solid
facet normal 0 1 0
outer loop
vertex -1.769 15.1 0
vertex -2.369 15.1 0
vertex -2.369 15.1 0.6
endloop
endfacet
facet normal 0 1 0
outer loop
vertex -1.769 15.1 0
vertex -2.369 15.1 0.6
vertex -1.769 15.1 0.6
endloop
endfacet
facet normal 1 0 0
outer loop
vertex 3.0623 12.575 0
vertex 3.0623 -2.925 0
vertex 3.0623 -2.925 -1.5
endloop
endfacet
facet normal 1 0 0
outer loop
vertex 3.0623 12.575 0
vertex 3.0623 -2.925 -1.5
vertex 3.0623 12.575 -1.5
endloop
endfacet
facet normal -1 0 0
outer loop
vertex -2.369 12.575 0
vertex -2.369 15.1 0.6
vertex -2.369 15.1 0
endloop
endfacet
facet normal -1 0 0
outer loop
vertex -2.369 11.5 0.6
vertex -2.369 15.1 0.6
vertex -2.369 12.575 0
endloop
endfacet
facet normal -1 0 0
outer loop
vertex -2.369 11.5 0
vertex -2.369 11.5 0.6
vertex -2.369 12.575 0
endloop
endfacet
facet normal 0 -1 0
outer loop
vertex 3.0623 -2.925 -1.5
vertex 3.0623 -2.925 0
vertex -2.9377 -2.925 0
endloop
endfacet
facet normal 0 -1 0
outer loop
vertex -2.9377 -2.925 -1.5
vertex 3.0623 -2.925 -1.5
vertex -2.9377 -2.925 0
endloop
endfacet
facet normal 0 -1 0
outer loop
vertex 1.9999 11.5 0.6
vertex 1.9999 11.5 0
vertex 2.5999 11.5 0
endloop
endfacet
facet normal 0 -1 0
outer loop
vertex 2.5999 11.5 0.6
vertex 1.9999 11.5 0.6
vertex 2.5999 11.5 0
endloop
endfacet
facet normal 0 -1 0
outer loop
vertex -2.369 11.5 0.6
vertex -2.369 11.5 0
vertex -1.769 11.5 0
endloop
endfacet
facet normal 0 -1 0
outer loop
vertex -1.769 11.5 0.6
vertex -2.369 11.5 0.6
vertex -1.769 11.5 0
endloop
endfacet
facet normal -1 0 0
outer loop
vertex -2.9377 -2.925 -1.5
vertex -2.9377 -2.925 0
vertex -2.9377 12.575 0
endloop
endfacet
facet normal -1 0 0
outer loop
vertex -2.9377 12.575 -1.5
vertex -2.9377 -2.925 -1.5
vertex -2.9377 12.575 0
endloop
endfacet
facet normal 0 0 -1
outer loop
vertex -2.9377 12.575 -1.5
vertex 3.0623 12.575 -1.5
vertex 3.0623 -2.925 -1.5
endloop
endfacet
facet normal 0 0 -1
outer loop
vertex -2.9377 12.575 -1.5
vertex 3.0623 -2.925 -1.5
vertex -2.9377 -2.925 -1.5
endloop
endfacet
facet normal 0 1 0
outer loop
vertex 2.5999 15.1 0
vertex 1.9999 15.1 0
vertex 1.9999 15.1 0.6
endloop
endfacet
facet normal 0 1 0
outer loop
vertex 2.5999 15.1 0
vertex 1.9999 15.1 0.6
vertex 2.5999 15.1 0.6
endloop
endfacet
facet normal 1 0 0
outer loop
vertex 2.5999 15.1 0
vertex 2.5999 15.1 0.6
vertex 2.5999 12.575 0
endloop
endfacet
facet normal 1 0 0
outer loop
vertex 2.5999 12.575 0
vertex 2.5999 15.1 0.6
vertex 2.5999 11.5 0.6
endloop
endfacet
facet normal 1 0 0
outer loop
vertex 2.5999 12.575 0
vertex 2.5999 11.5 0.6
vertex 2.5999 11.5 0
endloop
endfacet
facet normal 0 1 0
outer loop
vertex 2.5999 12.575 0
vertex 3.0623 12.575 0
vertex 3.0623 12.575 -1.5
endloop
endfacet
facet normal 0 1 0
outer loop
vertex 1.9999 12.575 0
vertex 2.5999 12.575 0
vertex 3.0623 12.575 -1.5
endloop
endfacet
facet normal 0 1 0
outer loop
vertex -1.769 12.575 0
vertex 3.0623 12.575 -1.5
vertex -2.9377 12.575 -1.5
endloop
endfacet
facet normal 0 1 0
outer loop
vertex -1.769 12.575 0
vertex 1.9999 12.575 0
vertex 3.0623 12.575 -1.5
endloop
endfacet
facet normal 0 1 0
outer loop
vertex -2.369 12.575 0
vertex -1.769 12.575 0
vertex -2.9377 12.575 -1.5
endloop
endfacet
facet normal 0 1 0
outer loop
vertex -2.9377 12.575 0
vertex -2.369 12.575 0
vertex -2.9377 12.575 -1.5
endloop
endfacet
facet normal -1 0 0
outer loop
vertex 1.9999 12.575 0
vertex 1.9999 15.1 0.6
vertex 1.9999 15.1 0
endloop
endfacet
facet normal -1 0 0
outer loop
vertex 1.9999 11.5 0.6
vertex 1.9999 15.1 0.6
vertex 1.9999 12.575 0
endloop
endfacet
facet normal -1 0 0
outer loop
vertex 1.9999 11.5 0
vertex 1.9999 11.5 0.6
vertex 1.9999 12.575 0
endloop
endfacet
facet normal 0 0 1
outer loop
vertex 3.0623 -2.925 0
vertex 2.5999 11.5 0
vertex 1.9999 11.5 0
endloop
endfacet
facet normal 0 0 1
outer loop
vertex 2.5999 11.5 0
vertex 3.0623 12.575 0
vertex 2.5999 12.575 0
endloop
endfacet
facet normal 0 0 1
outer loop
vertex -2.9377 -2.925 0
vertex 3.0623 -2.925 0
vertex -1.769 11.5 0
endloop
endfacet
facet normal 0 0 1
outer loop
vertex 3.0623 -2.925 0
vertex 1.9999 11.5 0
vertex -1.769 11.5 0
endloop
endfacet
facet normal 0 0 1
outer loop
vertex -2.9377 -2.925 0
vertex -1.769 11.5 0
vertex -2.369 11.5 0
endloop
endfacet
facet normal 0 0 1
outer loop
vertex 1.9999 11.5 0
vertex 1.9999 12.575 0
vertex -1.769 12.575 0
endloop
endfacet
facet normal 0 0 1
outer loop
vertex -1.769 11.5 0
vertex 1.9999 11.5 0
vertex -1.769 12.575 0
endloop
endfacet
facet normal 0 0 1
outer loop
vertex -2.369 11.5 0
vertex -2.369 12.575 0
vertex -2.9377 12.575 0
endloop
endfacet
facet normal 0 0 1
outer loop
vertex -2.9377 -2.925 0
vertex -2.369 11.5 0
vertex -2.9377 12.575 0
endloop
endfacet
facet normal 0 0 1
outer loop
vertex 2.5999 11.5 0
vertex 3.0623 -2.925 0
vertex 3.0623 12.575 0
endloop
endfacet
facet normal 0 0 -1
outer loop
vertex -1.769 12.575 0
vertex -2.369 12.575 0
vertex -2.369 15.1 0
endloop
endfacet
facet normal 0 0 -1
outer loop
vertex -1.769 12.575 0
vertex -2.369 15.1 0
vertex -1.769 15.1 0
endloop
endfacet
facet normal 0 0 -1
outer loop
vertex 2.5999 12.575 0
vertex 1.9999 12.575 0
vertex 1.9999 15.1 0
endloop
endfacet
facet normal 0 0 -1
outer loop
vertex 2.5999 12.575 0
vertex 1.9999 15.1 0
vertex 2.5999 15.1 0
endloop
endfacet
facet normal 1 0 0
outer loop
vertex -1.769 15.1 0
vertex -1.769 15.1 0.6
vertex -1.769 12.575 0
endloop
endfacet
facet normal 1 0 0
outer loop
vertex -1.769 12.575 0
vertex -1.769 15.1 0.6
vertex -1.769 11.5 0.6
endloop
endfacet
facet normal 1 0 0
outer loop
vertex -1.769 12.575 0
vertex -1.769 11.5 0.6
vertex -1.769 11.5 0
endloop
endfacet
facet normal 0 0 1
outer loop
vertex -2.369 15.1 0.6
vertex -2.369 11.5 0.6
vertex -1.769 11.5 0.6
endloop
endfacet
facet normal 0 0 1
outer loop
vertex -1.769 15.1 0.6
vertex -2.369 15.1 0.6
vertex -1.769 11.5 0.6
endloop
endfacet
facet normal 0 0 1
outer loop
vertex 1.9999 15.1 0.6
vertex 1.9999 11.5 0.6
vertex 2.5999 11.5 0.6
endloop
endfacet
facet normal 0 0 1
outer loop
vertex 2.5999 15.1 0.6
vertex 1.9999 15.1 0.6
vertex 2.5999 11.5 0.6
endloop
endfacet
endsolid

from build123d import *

# Parameters (mm, degrees)
SKICA1_W                 = 1.6
SKICA1_H                 = 0.85
P_IDAT_VYSUNUT_M1_DEPTH  = 0.45
SKICA2_W                 = 6
SKICA2_H                 = 15.5
P_IDAT_VYSUNUT_M2_DEPTH  = 1.5
P_IDAT_START             = 11.5
SKICA4_W                 = 0.6
SKICA4_H                 = 0.6
P_IDAT_VYSUNUT_M4_DEPTH  = 3.6
SKICA6_W                 = 1.6
SKICA6_H                 = 0.85
ODEBRAT_VYSUNUT_M1_DEPTH = 0.45


with BuildPart() as part:
    # Skica1 → Přidat vysunutím1 (new body)
    with BuildSketch(Plane.XY):
        Rectangle(SKICA1_W, SKICA1_H)
    extrude(amount=P_IDAT_VYSUNUT_M1_DEPTH)

    # Skica2 → Přidat vysunutím2 (add)
    with BuildSketch(Plane(origin=(0, 0, 0), x_dir=(-1, 0, 0), z_dir=(0, 0, -1))):
        with Locations((-0.062287775, 4.825)):
            Rectangle(SKICA2_W, SKICA2_H)
    extrude(amount=P_IDAT_VYSUNUT_M2_DEPTH)

    # Skica4 → Přidat vysunutím4 (add)
    with BuildSketch(Plane(origin=(0, 0, 0), x_dir=(1, 0, 0), z_dir=(0, 1, 0)).offset(P_IDAT_START)):
        with Locations((-2.068992039, -0.3)):
            Rectangle(SKICA4_W, SKICA4_H)
        with Locations((2.299906713, -0.3)):
            Rectangle(SKICA4_W, SKICA4_H)
    extrude(amount=P_IDAT_VYSUNUT_M4_DEPTH)

    # Skica6 → Odebrat vysunutím1 (cut)
    with BuildSketch(Plane.XY.offset(0.45)):
        Rectangle(SKICA6_W, SKICA6_H)
    extrude(amount=-ODEBRAT_VYSUNUT_M1_DEPTH, mode=Mode.SUBTRACT)


solid = part.part
